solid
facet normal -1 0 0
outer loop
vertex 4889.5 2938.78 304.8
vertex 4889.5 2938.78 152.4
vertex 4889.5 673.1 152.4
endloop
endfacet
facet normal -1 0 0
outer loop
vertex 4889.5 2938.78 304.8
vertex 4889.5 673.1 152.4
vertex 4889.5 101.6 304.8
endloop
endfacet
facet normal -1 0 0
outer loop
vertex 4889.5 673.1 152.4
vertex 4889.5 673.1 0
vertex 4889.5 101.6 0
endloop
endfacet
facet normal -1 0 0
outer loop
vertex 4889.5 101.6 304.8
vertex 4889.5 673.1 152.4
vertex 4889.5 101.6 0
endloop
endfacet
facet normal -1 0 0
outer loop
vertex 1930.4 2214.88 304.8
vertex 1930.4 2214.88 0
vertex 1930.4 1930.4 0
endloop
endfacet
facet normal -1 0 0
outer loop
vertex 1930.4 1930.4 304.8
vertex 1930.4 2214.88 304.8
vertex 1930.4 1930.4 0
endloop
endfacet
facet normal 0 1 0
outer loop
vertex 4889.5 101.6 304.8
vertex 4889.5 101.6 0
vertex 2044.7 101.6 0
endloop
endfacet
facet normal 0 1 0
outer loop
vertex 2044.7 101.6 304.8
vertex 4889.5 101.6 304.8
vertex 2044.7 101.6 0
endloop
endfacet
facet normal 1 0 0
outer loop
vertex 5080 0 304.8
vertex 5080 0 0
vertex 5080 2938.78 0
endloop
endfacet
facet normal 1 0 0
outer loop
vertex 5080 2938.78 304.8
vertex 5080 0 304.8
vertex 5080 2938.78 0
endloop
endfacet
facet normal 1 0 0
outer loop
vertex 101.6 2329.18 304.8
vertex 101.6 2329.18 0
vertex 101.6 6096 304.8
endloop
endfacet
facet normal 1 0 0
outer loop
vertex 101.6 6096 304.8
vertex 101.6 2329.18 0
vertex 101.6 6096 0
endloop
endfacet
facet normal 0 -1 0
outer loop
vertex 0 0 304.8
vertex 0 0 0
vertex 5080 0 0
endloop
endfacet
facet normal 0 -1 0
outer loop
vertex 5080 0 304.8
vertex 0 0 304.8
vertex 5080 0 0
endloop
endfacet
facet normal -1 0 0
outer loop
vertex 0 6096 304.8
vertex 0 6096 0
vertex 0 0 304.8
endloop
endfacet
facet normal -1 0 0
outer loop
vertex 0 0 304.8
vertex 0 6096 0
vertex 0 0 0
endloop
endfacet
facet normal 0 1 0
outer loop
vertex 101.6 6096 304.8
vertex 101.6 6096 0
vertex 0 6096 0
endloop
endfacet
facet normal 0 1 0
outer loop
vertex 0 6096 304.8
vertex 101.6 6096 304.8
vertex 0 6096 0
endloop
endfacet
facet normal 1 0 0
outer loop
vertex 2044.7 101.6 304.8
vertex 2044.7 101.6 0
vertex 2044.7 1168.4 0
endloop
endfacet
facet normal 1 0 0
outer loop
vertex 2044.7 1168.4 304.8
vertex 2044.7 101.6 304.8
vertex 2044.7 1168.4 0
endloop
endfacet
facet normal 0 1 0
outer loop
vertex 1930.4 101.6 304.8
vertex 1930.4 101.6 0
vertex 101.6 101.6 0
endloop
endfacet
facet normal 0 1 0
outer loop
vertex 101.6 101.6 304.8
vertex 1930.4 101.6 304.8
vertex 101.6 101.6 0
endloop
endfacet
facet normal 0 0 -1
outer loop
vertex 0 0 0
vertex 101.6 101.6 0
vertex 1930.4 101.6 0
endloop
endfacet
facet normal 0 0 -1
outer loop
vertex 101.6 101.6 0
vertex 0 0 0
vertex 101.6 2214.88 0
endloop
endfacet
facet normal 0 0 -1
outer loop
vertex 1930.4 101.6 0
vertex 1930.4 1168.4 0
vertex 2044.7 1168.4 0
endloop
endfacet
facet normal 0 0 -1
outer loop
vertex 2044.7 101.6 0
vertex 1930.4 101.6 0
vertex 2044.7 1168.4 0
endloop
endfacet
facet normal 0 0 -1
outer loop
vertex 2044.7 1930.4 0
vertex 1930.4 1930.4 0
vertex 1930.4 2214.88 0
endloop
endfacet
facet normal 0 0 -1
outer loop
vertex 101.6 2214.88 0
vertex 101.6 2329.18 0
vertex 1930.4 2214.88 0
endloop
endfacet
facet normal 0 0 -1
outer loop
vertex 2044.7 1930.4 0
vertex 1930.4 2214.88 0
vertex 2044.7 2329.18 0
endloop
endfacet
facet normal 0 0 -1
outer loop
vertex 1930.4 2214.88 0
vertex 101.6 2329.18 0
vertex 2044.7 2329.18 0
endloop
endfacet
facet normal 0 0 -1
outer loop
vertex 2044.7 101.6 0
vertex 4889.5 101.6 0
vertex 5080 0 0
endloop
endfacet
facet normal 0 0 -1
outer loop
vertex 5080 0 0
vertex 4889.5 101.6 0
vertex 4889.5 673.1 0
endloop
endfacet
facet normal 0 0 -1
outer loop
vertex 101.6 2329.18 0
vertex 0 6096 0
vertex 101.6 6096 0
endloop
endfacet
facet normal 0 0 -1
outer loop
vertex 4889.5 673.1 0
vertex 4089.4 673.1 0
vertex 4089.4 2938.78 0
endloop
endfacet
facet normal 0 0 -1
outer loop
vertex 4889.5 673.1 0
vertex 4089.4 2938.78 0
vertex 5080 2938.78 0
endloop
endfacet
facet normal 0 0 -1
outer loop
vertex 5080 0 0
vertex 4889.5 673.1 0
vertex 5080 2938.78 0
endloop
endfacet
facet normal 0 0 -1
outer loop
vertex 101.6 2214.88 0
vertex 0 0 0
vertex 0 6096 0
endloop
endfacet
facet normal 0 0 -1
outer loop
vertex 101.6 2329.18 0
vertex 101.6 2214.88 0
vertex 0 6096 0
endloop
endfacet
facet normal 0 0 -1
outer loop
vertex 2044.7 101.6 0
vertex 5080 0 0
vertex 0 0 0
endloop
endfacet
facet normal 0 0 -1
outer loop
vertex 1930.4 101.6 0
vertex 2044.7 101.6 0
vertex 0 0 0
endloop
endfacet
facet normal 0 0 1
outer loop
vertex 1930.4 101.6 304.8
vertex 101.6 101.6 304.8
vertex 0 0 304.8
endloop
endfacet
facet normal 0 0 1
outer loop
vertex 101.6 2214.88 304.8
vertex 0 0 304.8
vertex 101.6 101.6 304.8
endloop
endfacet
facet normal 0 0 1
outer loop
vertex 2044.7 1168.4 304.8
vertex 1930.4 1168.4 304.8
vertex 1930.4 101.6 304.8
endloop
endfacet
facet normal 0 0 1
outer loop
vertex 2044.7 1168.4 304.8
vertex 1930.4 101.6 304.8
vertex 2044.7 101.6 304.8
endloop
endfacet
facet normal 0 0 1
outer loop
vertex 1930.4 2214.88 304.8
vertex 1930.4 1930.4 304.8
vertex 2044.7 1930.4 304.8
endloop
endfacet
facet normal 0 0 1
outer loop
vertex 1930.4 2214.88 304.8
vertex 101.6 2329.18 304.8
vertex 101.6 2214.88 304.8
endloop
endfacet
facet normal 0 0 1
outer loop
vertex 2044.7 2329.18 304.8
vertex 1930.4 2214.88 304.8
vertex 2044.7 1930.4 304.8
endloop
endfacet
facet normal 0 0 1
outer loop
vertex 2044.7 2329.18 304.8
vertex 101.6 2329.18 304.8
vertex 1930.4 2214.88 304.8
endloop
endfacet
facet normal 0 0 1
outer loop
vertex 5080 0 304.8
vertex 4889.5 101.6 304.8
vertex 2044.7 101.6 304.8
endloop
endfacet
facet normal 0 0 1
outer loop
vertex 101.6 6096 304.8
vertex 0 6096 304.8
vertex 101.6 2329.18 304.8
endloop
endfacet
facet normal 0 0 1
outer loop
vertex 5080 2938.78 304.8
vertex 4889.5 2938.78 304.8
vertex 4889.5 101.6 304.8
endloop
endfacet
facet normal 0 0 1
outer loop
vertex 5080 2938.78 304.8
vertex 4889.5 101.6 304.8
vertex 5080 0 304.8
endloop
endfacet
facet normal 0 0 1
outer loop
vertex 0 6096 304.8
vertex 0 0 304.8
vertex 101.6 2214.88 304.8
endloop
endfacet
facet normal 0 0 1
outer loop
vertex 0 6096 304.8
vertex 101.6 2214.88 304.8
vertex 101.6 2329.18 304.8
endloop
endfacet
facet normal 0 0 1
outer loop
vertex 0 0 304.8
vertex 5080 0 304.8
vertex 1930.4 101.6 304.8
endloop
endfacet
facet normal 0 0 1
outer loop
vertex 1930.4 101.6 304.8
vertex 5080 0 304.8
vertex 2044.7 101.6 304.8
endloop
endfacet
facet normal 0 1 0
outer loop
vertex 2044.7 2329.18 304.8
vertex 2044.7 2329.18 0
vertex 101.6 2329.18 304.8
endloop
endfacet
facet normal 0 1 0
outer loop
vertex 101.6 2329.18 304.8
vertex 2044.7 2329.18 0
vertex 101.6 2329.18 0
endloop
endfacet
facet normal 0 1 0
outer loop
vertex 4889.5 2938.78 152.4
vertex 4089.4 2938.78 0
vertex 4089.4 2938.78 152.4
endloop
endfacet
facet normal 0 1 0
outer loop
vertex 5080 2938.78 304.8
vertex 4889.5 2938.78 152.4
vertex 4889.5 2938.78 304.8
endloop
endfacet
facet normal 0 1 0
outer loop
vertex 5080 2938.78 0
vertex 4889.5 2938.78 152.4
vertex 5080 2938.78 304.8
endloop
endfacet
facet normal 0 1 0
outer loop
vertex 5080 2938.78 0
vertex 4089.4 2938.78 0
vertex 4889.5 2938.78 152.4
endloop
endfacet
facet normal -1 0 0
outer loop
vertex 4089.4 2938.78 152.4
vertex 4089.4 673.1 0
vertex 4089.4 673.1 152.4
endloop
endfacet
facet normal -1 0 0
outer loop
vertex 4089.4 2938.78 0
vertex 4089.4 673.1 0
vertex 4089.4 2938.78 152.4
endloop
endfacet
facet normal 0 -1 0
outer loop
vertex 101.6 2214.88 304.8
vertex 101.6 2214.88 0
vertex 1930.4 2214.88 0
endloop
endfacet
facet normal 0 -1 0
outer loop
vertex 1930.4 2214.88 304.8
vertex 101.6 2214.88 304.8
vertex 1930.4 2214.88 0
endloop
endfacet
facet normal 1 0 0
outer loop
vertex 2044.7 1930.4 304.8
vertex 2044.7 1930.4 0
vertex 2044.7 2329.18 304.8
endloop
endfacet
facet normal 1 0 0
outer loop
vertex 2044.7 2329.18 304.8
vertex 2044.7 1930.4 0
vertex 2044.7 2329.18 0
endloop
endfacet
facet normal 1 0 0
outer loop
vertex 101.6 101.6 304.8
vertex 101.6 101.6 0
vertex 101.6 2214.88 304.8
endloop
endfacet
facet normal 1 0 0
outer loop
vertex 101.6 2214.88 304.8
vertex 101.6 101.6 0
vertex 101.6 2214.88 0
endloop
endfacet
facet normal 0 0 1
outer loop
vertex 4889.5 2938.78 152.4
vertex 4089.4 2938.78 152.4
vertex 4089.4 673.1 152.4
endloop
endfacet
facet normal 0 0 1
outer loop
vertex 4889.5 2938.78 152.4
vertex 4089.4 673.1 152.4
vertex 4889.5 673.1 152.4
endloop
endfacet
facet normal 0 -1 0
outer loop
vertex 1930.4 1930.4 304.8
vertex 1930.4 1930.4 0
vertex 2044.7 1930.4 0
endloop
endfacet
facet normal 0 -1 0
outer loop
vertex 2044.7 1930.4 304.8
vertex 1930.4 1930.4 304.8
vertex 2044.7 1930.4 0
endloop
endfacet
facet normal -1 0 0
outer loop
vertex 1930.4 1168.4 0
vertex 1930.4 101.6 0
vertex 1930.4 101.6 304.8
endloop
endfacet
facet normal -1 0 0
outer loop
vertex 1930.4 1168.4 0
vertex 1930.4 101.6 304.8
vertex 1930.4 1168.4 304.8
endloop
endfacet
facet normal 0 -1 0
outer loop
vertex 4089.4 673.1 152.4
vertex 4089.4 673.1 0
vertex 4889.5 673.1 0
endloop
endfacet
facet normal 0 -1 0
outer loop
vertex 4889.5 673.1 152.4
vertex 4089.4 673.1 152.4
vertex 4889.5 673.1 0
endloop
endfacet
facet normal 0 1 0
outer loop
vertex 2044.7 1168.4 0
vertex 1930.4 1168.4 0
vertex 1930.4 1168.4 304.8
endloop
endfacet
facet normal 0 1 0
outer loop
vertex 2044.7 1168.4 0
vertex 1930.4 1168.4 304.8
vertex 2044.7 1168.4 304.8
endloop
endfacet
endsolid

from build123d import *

# Parameters (mm, degrees)
F4_DEPTH = 304.8
F2_W     = 990.6
F2_H     = 2265.68
F5_DEPTH = 152.4
F6_W     = 114.3
F6_H     = 1066.8
F7_DEPTH = 304.8


with BuildPart() as f4:
    # F3 (on Top) → F4 (new body)
    with BuildSketch(Plane.XY):
        Polygon((101.6, 101.6), (101.6, 6096), (0, 6096), (0, 0), (5080, 0), (5080, 2938.78), (4889.5, 2938.78), (4889.5, 101.6), align=None)
    extrude(amount=F4_DEPTH)

    # F2 (on Top) → F5 (join)
    with BuildSketch(Plane.XY):
        with Locations((4584.7, 1805.94)):
            Rectangle(F2_W, F2_H)
    extrude(amount=F5_DEPTH)

    # F6 (on Top) → F7 (join)
    with BuildSketch(Plane.XY):
        Polygon((2044.7, 2329.18), (101.6, 2329.18), (101.6, 2214.88), (1930.4, 2214.88), (1930.4, 1930.4), (2044.7, 1930.4), align=None)
        with Locations((1987.55, 635)):
            Rectangle(F6_W, F6_H)
    extrude(amount=F7_DEPTH)


solid = f4.part
